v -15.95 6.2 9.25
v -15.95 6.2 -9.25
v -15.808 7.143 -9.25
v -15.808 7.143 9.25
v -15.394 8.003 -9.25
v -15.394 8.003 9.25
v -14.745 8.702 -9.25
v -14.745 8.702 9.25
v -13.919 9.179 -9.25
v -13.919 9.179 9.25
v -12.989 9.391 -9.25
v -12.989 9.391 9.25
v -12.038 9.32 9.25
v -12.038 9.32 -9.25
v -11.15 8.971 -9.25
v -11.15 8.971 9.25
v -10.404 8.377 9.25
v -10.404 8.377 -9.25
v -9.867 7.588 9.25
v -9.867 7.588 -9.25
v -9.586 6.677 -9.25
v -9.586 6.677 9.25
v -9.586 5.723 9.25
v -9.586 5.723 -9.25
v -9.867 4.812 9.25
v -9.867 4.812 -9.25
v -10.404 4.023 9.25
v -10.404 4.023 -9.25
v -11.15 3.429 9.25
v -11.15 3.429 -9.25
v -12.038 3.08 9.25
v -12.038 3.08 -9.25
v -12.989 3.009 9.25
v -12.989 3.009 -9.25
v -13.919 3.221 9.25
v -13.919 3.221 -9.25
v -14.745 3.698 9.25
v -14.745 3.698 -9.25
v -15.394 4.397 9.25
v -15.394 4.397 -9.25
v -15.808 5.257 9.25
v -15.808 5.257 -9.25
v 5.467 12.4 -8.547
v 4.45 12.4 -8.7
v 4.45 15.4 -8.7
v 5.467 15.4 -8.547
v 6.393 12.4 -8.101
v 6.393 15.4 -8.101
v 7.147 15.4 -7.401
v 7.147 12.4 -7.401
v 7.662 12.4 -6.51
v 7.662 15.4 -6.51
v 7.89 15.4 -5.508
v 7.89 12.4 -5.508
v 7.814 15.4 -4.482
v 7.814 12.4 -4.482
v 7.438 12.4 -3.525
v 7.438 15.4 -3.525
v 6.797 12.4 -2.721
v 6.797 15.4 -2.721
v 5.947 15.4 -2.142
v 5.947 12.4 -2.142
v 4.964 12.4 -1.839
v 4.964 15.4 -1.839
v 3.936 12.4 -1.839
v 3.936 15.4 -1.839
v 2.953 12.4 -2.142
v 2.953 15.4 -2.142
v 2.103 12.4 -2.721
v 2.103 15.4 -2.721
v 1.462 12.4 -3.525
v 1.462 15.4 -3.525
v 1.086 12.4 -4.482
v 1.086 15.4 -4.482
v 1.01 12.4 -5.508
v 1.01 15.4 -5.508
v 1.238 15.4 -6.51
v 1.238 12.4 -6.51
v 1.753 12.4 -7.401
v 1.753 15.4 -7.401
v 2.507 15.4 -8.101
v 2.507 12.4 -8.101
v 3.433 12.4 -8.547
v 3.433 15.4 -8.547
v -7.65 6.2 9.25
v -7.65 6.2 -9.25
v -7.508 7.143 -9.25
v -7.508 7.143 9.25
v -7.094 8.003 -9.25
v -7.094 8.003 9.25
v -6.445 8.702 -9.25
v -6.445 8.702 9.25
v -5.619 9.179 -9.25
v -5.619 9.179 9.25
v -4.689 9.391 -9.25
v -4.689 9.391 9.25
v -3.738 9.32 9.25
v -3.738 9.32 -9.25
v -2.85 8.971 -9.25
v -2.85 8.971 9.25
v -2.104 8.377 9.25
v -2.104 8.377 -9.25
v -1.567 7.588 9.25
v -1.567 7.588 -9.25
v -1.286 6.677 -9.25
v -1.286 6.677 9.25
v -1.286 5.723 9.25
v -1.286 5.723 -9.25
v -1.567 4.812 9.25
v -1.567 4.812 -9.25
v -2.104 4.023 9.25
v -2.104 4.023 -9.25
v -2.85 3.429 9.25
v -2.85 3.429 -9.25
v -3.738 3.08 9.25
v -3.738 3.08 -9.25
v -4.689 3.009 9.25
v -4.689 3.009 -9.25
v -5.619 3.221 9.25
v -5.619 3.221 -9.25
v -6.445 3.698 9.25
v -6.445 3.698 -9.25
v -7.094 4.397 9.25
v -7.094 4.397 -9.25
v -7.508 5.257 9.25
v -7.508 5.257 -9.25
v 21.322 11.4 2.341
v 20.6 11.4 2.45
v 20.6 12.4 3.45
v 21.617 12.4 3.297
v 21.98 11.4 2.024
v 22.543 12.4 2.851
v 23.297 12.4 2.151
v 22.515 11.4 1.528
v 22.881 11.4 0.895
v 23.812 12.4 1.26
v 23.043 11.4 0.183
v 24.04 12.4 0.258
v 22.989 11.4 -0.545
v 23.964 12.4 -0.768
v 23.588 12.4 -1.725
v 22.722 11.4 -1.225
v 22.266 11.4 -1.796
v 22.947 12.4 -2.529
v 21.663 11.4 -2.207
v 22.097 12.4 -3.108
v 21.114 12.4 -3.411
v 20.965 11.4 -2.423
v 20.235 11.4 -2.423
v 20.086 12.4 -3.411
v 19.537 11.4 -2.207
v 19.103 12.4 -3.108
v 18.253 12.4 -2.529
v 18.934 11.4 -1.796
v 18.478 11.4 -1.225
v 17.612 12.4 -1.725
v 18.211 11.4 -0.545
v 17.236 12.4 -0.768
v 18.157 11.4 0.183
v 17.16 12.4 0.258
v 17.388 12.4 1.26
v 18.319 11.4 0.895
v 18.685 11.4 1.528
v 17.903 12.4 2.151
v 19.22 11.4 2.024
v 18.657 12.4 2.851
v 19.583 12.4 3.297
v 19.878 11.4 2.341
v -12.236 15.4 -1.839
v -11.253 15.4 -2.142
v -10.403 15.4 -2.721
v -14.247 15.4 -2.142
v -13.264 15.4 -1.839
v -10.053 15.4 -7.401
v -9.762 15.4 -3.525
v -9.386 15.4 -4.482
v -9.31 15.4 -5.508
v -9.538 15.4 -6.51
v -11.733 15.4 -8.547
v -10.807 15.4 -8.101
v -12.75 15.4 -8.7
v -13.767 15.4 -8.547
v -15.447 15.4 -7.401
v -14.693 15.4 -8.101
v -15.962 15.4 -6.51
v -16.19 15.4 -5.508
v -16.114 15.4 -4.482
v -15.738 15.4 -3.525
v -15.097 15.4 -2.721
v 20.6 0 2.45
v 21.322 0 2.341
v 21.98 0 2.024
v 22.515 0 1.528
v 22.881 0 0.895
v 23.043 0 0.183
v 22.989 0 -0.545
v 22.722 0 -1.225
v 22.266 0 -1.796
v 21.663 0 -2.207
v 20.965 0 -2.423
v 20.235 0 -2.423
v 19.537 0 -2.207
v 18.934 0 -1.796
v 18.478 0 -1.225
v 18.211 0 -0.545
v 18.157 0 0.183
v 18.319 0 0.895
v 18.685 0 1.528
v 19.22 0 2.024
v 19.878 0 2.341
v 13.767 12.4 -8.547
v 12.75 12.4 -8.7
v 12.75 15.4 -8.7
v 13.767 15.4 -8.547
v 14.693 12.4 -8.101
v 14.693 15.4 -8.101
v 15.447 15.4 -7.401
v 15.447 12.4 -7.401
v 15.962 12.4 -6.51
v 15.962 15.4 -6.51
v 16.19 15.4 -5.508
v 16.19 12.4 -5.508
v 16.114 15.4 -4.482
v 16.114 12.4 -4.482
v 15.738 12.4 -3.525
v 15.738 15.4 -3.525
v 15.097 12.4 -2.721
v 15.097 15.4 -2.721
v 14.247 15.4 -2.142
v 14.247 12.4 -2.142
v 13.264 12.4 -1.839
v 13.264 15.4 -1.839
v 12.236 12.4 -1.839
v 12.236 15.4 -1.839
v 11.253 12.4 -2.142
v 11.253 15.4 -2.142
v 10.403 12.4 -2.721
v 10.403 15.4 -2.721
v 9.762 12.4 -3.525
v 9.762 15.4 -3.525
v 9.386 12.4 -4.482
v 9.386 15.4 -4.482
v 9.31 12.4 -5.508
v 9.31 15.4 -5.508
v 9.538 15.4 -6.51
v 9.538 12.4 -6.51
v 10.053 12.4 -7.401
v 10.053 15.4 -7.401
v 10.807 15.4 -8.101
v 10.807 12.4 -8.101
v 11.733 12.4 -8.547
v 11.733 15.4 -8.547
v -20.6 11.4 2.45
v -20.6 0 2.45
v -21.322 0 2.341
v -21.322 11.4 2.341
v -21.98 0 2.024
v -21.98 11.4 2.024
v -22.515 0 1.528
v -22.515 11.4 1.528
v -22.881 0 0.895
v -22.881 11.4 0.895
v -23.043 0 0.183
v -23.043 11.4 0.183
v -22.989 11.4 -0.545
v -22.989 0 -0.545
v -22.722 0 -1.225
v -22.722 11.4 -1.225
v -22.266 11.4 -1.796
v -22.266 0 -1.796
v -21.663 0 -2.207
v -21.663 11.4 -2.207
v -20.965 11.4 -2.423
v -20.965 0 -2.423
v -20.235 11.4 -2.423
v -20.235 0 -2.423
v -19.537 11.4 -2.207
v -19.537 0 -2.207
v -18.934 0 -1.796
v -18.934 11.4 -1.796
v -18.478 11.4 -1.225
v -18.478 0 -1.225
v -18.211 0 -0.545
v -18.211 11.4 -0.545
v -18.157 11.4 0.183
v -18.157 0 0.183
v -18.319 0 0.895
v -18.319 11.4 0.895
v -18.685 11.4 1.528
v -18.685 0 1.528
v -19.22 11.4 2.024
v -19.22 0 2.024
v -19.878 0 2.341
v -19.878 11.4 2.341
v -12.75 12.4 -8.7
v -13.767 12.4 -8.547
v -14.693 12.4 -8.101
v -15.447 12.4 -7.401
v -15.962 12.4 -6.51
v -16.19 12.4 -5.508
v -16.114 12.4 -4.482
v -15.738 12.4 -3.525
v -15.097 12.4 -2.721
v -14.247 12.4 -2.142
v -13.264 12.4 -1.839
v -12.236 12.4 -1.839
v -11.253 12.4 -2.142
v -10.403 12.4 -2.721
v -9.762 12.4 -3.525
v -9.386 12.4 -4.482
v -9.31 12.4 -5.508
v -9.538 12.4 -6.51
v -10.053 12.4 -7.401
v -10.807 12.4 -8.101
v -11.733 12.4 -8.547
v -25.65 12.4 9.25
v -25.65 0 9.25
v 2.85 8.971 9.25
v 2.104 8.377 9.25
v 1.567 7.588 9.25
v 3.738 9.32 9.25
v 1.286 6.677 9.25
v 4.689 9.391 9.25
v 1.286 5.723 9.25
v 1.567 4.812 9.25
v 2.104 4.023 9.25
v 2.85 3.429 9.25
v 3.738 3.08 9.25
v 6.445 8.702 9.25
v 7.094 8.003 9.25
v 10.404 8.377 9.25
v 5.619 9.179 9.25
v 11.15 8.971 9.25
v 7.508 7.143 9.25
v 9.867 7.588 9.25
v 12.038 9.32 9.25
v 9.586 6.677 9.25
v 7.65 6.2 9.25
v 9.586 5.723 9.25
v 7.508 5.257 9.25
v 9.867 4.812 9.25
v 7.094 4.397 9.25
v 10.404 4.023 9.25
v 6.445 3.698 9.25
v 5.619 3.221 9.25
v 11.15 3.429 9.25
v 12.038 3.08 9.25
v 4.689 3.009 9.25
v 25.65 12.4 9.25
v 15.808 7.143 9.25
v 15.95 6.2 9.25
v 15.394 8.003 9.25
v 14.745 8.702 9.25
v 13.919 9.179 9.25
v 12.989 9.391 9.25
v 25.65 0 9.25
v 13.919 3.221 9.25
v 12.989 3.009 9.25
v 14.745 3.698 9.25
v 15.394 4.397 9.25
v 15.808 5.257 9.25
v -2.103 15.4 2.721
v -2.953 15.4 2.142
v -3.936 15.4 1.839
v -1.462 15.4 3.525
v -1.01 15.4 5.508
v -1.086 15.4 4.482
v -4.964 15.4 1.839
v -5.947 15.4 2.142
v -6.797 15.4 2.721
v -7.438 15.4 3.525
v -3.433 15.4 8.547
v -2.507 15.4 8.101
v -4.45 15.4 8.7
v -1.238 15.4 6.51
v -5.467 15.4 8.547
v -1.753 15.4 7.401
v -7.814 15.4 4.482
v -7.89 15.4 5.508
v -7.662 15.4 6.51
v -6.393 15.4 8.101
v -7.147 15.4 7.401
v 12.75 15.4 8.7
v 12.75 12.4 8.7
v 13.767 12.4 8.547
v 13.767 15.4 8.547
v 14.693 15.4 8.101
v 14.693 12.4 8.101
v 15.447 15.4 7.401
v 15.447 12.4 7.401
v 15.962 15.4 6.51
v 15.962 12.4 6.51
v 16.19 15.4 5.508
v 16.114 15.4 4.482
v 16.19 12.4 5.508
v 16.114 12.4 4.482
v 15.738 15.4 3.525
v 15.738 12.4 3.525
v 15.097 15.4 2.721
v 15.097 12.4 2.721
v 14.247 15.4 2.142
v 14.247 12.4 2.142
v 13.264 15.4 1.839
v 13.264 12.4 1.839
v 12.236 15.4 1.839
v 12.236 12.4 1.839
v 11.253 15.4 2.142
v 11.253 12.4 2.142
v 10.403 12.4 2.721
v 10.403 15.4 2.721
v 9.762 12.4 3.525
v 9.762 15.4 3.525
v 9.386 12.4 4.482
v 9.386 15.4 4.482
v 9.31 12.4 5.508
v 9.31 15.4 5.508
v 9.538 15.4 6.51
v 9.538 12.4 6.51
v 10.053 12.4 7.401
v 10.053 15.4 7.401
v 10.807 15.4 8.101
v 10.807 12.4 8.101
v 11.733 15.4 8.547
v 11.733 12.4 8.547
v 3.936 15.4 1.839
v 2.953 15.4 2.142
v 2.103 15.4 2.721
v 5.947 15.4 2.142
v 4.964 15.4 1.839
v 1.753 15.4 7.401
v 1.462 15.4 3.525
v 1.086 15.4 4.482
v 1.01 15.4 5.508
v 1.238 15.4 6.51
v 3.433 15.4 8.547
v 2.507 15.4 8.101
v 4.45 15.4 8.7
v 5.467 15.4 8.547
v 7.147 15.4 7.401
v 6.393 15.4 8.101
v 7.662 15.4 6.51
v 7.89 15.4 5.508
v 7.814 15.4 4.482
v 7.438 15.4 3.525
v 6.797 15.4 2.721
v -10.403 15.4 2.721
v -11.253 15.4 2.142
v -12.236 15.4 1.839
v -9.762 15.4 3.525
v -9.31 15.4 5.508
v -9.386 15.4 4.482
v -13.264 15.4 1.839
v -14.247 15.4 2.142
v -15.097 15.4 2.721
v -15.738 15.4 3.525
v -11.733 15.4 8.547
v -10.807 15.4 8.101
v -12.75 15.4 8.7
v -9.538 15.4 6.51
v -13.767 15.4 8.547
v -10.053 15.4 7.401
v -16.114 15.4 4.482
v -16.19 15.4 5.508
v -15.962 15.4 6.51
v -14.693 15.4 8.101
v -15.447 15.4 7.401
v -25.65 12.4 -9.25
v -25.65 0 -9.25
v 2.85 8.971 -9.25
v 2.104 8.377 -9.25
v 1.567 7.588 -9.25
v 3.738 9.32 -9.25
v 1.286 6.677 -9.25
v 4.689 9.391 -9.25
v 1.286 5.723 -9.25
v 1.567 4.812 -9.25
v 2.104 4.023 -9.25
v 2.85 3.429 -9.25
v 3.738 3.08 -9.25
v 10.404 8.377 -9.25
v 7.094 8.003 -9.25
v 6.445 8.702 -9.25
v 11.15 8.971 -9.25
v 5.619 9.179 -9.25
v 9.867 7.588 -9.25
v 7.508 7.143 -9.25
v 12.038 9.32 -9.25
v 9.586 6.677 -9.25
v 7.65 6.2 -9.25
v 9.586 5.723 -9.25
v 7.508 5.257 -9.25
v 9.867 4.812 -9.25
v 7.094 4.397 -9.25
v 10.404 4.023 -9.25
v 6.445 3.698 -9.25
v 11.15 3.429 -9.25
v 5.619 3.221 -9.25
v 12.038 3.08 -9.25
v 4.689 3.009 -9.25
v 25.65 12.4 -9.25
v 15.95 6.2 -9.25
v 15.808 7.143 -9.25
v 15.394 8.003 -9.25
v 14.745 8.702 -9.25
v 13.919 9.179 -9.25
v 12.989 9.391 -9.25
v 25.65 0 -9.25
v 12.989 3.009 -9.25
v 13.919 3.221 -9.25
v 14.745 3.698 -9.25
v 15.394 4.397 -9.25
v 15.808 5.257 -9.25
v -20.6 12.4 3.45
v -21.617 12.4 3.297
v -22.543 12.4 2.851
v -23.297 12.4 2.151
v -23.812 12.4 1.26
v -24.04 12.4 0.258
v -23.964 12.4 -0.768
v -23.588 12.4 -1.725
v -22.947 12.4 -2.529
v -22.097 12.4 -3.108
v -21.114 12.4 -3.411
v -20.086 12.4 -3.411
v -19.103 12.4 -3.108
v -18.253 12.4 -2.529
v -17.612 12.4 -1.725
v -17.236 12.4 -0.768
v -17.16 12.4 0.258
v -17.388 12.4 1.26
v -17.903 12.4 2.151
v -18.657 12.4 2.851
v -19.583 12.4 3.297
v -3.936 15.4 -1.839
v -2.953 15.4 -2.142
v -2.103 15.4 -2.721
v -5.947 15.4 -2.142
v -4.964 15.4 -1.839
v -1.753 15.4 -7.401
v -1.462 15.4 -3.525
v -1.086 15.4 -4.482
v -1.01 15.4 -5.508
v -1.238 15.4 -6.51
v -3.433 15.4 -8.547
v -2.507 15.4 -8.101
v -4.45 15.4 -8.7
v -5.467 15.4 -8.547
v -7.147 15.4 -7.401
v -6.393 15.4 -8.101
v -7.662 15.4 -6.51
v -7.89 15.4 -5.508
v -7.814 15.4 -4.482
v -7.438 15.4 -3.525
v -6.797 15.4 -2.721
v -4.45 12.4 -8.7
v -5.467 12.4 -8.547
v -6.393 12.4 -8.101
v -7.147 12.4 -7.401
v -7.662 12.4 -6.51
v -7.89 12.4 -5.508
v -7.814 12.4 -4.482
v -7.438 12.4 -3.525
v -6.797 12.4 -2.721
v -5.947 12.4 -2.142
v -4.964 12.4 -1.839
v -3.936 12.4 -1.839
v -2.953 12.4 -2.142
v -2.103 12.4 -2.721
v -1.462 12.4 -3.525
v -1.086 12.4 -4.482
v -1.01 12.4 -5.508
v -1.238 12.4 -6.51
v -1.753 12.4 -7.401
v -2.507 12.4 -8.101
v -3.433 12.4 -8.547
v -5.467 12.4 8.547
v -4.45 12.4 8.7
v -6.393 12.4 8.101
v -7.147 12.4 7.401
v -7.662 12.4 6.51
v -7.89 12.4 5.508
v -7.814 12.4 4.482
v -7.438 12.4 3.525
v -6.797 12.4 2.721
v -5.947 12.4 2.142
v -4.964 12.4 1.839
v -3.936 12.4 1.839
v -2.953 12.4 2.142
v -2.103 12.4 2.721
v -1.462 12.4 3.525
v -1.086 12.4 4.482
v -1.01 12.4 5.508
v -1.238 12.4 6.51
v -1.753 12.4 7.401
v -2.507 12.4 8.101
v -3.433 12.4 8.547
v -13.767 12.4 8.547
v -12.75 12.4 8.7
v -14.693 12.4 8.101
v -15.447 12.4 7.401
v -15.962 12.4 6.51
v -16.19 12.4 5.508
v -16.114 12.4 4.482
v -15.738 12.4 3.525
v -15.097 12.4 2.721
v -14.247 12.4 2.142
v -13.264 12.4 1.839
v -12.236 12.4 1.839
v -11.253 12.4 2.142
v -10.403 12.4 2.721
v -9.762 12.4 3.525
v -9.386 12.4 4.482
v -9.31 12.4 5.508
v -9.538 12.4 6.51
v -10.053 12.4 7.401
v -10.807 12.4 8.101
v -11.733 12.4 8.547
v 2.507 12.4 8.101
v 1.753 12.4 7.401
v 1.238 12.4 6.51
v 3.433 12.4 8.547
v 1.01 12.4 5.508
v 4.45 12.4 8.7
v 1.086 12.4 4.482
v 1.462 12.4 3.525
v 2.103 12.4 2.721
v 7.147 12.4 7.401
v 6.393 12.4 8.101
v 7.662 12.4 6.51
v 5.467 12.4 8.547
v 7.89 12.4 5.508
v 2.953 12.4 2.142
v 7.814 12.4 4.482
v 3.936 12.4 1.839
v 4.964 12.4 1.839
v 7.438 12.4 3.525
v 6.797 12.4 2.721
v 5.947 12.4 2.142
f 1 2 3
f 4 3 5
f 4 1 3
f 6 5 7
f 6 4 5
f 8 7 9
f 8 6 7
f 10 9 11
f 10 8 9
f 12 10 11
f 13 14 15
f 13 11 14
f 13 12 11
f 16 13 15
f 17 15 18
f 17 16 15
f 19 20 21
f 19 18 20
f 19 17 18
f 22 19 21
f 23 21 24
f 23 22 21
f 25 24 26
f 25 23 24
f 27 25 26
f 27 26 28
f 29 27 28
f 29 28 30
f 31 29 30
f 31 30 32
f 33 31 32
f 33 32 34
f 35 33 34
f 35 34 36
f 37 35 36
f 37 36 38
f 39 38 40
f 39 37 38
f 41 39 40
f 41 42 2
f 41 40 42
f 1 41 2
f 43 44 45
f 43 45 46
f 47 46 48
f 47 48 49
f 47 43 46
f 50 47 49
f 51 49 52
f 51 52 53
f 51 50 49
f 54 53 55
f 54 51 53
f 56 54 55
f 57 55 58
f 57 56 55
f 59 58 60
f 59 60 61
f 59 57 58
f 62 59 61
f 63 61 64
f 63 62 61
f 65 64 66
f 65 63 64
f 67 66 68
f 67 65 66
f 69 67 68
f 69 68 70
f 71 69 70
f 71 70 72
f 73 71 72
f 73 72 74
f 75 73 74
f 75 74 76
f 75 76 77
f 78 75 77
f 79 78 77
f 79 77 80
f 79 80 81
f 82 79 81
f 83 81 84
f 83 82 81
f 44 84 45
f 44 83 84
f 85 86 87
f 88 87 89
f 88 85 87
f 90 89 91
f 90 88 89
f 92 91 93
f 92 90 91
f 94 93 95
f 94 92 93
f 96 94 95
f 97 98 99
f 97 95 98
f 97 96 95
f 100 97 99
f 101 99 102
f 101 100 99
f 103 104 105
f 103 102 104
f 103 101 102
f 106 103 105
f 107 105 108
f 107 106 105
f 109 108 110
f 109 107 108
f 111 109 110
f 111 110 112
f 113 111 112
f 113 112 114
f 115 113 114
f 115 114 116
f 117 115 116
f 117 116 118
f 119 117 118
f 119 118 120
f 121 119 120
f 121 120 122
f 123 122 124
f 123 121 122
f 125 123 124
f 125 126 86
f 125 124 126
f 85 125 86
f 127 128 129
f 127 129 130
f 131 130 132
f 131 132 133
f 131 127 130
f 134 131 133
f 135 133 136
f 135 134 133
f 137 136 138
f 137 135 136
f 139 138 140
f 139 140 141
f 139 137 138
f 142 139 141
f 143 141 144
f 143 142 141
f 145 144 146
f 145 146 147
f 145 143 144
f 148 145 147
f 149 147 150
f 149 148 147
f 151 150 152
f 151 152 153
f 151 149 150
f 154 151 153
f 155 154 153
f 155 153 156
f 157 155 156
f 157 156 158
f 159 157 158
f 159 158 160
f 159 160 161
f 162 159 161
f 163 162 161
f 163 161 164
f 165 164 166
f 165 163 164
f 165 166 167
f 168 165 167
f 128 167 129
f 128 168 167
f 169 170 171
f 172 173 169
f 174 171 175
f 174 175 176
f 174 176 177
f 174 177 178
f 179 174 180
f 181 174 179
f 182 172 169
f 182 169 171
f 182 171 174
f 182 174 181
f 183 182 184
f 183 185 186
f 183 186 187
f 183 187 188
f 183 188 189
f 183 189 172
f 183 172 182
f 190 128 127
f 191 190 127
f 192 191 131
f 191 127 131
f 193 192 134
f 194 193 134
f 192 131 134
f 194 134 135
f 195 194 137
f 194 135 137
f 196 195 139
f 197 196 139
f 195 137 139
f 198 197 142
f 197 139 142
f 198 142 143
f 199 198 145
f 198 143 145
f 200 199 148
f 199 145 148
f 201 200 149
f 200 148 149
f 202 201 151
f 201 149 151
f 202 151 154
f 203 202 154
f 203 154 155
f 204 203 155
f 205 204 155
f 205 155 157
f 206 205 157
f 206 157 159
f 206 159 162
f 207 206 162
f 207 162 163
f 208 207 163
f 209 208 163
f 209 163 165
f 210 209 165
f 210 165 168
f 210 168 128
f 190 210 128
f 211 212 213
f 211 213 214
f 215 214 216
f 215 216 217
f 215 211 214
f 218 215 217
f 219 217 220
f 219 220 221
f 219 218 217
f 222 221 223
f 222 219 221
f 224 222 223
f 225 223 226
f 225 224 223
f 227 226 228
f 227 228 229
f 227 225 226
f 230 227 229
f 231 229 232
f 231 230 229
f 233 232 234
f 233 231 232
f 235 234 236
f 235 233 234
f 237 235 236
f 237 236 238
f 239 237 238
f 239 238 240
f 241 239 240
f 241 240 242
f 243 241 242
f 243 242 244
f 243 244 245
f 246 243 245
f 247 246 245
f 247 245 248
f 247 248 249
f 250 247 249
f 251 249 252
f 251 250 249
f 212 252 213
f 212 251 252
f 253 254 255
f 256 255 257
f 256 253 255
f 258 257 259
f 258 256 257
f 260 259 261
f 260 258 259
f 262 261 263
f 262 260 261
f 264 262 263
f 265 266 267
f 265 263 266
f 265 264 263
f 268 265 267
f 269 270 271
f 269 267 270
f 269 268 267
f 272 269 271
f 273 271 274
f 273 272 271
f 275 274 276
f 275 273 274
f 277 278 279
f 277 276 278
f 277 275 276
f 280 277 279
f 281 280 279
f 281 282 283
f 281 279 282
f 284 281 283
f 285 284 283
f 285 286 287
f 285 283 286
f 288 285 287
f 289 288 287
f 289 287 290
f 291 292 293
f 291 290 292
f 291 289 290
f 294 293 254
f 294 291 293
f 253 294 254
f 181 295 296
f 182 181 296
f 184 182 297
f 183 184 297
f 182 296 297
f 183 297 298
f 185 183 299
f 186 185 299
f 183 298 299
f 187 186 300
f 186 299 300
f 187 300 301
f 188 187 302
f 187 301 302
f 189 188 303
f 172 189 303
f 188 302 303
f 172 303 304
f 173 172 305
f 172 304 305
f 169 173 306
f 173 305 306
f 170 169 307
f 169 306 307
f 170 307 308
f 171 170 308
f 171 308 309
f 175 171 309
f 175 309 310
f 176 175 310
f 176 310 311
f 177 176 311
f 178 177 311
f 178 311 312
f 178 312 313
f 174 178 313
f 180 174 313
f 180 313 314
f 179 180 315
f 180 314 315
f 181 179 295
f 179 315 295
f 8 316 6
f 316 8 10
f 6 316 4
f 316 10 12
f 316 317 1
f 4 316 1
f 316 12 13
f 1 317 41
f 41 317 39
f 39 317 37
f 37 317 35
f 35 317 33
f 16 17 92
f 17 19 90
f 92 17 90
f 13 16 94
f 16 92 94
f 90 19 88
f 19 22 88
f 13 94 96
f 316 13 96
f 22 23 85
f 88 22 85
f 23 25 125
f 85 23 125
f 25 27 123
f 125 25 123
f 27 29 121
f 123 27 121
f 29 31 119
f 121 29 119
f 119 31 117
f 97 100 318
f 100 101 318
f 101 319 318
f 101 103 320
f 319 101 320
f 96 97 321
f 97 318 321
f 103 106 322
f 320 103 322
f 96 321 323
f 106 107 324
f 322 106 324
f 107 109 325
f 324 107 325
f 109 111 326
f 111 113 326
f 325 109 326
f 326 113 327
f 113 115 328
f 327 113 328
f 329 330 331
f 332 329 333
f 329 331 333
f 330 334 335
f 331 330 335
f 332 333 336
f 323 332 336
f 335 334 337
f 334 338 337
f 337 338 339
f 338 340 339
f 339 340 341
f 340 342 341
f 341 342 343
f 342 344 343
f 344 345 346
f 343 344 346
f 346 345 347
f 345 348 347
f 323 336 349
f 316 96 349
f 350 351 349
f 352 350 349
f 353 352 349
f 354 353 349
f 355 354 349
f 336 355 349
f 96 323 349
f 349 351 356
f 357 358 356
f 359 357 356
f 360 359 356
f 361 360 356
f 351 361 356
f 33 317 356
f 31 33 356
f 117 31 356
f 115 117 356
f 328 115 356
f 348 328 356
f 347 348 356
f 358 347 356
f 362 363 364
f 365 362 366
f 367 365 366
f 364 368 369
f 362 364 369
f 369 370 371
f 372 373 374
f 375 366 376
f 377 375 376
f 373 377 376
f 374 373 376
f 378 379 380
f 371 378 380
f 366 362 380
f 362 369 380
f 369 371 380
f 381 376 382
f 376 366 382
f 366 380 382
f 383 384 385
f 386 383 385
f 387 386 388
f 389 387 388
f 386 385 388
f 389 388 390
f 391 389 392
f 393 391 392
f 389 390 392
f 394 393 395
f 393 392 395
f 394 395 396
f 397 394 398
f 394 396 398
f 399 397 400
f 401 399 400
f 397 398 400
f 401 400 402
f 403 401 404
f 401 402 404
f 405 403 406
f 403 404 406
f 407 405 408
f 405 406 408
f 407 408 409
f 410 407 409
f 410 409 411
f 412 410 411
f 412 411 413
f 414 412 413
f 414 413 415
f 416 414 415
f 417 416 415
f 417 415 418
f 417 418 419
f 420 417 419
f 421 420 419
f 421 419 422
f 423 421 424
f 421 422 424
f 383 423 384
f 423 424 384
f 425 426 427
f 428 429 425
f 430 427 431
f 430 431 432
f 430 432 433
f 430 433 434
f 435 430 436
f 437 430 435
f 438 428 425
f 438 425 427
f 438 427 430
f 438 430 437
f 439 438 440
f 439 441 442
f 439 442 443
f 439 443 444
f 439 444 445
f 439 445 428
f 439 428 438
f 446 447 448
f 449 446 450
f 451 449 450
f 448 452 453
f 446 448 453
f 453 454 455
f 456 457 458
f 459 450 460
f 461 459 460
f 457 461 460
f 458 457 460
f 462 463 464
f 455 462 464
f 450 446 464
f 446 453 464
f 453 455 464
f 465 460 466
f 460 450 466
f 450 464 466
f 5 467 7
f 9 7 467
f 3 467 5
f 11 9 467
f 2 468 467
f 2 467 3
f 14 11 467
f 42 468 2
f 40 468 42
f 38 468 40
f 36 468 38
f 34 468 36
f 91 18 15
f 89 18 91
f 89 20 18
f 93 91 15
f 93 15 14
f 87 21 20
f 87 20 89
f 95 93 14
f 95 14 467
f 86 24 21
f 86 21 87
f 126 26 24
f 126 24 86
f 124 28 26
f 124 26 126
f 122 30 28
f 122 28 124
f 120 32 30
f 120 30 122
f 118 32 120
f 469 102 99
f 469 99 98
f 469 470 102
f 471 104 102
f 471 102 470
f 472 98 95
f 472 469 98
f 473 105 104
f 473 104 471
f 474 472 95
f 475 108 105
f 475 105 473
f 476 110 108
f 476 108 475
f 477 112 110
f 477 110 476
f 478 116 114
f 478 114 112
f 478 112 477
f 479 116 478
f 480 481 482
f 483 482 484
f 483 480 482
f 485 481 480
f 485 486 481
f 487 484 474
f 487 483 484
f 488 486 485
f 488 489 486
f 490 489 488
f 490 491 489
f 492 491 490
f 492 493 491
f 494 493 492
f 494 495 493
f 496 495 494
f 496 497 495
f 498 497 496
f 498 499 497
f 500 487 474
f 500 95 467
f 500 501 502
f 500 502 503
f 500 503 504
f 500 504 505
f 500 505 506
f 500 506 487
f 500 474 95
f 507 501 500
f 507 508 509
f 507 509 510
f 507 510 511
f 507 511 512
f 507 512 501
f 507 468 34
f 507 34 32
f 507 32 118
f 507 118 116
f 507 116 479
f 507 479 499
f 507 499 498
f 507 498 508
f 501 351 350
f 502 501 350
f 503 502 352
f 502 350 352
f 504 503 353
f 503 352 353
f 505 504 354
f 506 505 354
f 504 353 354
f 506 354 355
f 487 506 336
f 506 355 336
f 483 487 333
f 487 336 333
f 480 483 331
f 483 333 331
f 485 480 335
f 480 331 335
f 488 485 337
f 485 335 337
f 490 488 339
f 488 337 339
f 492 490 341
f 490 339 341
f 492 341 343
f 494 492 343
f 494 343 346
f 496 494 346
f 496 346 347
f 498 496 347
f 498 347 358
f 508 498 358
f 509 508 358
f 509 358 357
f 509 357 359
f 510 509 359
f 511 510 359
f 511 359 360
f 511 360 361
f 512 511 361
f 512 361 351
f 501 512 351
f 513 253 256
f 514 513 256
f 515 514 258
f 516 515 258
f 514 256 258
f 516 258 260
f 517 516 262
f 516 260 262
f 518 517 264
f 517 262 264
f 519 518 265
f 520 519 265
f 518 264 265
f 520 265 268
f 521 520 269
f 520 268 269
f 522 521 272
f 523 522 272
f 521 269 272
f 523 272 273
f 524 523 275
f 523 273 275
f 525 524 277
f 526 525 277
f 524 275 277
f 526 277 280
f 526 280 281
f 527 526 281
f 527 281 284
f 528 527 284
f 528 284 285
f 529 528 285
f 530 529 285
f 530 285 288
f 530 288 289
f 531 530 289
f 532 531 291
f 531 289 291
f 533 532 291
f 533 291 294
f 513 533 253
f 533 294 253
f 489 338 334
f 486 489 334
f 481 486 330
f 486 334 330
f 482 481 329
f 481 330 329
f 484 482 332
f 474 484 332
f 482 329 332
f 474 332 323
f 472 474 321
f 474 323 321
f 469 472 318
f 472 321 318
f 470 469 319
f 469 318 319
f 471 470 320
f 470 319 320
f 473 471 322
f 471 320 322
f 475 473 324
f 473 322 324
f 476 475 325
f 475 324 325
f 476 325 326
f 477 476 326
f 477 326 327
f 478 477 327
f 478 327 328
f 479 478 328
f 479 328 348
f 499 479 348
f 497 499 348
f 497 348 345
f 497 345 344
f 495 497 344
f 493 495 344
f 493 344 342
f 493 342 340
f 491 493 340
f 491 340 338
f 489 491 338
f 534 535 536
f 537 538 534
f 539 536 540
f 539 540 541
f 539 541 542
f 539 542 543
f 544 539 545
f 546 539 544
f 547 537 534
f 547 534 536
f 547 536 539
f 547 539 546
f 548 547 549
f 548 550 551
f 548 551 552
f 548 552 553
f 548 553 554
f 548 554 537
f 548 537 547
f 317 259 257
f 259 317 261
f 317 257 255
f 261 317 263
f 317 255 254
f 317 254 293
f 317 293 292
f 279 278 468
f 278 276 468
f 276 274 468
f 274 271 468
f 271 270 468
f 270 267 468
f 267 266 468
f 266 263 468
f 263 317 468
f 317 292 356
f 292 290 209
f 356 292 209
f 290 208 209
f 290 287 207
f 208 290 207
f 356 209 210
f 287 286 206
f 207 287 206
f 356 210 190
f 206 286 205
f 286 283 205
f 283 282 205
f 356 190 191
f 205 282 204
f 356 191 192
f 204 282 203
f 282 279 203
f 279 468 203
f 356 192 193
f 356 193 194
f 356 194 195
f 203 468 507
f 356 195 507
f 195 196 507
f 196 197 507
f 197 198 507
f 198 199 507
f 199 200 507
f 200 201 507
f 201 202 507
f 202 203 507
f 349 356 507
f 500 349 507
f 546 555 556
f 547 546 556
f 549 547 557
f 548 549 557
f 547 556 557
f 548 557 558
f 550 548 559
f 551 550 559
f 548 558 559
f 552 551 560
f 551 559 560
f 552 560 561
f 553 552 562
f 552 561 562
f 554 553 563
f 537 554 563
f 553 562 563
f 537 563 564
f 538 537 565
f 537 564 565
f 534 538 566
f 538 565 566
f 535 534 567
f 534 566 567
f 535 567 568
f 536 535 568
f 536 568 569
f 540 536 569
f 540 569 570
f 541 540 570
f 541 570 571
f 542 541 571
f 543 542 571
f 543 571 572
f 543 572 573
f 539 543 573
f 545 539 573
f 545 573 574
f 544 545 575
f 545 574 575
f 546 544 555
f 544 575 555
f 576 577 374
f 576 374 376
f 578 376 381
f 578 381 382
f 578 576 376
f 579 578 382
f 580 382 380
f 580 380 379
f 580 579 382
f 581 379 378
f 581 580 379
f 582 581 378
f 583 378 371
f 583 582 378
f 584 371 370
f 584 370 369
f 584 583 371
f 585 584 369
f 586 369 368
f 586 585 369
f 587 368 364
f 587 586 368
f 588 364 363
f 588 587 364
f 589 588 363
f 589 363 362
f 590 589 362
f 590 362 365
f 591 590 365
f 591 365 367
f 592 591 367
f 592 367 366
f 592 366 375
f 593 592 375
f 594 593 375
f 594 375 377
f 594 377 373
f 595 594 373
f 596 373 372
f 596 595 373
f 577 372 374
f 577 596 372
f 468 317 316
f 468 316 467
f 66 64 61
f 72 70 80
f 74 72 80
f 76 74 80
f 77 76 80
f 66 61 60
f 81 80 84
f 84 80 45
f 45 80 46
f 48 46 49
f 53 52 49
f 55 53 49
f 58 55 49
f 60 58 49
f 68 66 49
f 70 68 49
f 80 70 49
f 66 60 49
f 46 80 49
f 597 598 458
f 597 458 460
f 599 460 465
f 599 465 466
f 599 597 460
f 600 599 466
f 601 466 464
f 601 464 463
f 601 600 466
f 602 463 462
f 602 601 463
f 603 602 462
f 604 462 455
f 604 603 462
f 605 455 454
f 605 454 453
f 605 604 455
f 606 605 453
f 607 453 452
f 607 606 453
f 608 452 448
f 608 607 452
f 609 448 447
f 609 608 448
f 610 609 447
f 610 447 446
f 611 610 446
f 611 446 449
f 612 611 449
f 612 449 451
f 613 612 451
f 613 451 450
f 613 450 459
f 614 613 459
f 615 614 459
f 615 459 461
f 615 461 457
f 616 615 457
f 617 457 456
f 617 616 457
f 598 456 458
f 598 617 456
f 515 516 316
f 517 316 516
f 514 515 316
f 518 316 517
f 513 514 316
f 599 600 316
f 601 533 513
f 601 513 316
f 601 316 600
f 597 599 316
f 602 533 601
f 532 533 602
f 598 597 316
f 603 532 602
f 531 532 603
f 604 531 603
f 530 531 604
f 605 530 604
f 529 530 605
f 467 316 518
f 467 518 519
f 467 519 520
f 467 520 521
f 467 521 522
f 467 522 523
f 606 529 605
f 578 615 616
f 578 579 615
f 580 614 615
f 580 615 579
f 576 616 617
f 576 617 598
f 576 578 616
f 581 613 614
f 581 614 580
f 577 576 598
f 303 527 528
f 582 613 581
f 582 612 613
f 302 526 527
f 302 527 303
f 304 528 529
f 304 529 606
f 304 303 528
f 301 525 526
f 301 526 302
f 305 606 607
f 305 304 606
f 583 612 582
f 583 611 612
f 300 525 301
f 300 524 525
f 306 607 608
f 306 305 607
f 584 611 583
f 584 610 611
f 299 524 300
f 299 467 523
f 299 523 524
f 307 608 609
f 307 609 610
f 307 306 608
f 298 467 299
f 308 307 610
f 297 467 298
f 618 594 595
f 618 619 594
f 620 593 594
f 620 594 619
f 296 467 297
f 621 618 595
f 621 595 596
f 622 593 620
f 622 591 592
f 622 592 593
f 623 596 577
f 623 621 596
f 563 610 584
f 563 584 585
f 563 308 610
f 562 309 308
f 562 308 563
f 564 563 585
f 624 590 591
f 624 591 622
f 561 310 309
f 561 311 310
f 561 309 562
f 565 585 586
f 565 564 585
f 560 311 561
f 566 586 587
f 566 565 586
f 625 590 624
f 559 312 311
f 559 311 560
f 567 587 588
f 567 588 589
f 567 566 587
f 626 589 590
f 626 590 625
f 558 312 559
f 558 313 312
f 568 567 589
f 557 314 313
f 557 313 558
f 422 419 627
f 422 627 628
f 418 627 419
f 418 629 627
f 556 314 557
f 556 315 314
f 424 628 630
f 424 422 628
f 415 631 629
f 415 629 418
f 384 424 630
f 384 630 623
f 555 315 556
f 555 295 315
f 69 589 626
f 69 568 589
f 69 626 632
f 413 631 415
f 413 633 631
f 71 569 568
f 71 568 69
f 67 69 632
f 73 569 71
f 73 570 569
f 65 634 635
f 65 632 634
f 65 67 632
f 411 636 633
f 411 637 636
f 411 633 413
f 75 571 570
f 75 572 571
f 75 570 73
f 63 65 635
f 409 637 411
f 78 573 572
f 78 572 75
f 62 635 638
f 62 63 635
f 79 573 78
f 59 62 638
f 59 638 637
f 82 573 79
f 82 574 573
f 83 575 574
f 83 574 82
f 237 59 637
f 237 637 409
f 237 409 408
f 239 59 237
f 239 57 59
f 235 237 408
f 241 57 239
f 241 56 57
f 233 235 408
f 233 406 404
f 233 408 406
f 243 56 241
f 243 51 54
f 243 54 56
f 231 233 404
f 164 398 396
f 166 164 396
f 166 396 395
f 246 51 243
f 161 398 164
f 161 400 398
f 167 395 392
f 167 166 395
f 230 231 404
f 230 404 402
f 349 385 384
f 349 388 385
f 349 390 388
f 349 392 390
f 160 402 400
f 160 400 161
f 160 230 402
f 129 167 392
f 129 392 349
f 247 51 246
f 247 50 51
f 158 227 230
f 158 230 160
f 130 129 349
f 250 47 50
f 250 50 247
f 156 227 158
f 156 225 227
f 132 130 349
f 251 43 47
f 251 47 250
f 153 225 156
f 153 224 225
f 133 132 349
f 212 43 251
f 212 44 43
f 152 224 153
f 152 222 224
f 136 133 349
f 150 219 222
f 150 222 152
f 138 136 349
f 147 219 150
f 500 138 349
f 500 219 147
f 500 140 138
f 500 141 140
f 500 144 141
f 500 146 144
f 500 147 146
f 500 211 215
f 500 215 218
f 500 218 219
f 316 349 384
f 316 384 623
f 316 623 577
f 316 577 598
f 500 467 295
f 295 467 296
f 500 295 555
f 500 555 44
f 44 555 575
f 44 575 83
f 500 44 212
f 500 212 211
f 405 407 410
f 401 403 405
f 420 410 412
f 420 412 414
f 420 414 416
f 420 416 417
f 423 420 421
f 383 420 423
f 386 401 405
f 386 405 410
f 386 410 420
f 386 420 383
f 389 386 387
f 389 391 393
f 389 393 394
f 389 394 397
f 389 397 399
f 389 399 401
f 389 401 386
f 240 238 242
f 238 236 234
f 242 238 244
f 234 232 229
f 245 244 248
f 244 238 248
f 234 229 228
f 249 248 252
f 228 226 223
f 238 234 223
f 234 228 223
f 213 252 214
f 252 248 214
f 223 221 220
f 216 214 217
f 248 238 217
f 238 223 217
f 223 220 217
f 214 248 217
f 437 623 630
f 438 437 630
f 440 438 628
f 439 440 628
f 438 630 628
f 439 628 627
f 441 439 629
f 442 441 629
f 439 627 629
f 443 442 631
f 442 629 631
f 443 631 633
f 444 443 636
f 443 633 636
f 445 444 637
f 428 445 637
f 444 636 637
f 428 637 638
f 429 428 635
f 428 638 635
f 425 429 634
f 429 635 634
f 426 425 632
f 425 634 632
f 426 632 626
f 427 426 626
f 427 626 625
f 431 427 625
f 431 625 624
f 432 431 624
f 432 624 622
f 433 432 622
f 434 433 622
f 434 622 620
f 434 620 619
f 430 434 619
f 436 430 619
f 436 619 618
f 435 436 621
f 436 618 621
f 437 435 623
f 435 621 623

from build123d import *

# Parameters (mm, degrees)
SKETCH1_W               = 51.3
SKETCH1_H               = 18.5
BOSS_EXTRUDE1_DEPTH     = 12.4
SKETCH2_R               = 3.2
CUT_EXTRUDE1_DEPTH      = 34.969581982
SKETCH3_R               = 2.45
CUT_EXTRUDE2_DEPTH      = 30.95404814
CHAMFER1_SIZE           = 1
SKETCH4_R               = 3.45
BOSS_EXTRUDE2_DEPTH     = 3
MIRROR3_COPY_1_SKETCH_R = 3.45
MIRROR3_COPY_1_DEPTH    = 3


with BuildPart() as part:
    # Sketch1 → Boss-Extrude1 (new body)
    with BuildSketch(Plane(origin=(0, 0, 0), x_dir=(1, 0, 0), z_dir=(0, 1, 0))):
        Rectangle(SKETCH1_W, SKETCH1_H)
    extrude(amount=BOSS_EXTRUDE1_DEPTH)

    # Sketch2 → Cut-Extrude1 (cut, through all)
    with BuildSketch(Plane.XY.offset(9.25)):
        with Locations((4.45, 6.2)):
            Circle(SKETCH2_R)
        with Locations((12.75, 6.2)):
            Circle(SKETCH2_R)
    cut_extrude1 = extrude(amount=-CUT_EXTRUDE1_DEPTH, mode=Mode.SUBTRACT)

    # Sketch3 → Cut-Extrude2 (cut, through all)
    with BuildSketch(Plane(origin=(0, 12.4, 0), x_dir=(1, 0, 0), z_dir=(0, 1, 0))):
        with Locations(Location((20.6, 0, 0), (0, 0, 270))):
            Circle(SKETCH3_R)
    cut_extrude2 = extrude(amount=-CUT_EXTRUDE2_DEPTH, mode=Mode.SUBTRACT)

    # Mirror1: Cut-Extrude1, Cut-Extrude2 across plane
    add(cut_extrude1.mirror(Plane(origin=(0, 0, 0), x_dir=(0, 0, 1), z_dir=(1, 0, 0))), mode=Mode.SUBTRACT)
    add(cut_extrude2.mirror(Plane(origin=(0, 0, 0), x_dir=(0, 0, 1), z_dir=(1, 0, 0))), mode=Mode.SUBTRACT)

    # Chamfer1
    chamfer1_edges = [part.edges().sort_by_distance(p)[0] for p in [
        (20.6, 12.4, -2.45),
        (-20.6, 12.4, -2.45),
    ]]
    chamfer(chamfer1_edges, length=CHAMFER1_SIZE)

    # Sketch4 → Boss-Extrude2 (add)
    with BuildSketch(Plane(origin=(0, 12.4, 0), x_dir=(1, 0, 0), z_dir=(0, 1, 0))):
        with Locations(Location((4.45, -5.25, 0), (0, 0, 270))):
            Circle(SKETCH4_R)
        with Locations(Location((12.75, -5.25, 0), (0, 0, 270))):
            Circle(SKETCH4_R)
    boss_extrude2 = extrude(amount=BOSS_EXTRUDE2_DEPTH)

    # Mirror2: Boss-Extrude2 across plane
    add(boss_extrude2.mirror(Plane.XY))

    # Mirror3: Boss-Extrude2 across plane
    add(boss_extrude2.mirror(Plane(origin=(0, 0, 0), x_dir=(0, 0, 1), z_dir=(1, 0, 0))))

    # Mirror3 copy 1 sketch → Mirror3 copy 1 (add)
    with BuildSketch(Plane(origin=(0, 12.4, 0), x_dir=(-1, 0, 0), z_dir=(0, 1, 0))):
        with Locations(Location((4.45, -5.25, 0), (0, 0, 270))):
            Circle(MIRROR3_COPY_1_SKETCH_R)
        with Locations(Location((12.75, -5.25, 0), (0, 0, 270))):
            Circle(MIRROR3_COPY_1_SKETCH_R)
    extrude(amount=MIRROR3_COPY_1_DEPTH)


solid = part.part
